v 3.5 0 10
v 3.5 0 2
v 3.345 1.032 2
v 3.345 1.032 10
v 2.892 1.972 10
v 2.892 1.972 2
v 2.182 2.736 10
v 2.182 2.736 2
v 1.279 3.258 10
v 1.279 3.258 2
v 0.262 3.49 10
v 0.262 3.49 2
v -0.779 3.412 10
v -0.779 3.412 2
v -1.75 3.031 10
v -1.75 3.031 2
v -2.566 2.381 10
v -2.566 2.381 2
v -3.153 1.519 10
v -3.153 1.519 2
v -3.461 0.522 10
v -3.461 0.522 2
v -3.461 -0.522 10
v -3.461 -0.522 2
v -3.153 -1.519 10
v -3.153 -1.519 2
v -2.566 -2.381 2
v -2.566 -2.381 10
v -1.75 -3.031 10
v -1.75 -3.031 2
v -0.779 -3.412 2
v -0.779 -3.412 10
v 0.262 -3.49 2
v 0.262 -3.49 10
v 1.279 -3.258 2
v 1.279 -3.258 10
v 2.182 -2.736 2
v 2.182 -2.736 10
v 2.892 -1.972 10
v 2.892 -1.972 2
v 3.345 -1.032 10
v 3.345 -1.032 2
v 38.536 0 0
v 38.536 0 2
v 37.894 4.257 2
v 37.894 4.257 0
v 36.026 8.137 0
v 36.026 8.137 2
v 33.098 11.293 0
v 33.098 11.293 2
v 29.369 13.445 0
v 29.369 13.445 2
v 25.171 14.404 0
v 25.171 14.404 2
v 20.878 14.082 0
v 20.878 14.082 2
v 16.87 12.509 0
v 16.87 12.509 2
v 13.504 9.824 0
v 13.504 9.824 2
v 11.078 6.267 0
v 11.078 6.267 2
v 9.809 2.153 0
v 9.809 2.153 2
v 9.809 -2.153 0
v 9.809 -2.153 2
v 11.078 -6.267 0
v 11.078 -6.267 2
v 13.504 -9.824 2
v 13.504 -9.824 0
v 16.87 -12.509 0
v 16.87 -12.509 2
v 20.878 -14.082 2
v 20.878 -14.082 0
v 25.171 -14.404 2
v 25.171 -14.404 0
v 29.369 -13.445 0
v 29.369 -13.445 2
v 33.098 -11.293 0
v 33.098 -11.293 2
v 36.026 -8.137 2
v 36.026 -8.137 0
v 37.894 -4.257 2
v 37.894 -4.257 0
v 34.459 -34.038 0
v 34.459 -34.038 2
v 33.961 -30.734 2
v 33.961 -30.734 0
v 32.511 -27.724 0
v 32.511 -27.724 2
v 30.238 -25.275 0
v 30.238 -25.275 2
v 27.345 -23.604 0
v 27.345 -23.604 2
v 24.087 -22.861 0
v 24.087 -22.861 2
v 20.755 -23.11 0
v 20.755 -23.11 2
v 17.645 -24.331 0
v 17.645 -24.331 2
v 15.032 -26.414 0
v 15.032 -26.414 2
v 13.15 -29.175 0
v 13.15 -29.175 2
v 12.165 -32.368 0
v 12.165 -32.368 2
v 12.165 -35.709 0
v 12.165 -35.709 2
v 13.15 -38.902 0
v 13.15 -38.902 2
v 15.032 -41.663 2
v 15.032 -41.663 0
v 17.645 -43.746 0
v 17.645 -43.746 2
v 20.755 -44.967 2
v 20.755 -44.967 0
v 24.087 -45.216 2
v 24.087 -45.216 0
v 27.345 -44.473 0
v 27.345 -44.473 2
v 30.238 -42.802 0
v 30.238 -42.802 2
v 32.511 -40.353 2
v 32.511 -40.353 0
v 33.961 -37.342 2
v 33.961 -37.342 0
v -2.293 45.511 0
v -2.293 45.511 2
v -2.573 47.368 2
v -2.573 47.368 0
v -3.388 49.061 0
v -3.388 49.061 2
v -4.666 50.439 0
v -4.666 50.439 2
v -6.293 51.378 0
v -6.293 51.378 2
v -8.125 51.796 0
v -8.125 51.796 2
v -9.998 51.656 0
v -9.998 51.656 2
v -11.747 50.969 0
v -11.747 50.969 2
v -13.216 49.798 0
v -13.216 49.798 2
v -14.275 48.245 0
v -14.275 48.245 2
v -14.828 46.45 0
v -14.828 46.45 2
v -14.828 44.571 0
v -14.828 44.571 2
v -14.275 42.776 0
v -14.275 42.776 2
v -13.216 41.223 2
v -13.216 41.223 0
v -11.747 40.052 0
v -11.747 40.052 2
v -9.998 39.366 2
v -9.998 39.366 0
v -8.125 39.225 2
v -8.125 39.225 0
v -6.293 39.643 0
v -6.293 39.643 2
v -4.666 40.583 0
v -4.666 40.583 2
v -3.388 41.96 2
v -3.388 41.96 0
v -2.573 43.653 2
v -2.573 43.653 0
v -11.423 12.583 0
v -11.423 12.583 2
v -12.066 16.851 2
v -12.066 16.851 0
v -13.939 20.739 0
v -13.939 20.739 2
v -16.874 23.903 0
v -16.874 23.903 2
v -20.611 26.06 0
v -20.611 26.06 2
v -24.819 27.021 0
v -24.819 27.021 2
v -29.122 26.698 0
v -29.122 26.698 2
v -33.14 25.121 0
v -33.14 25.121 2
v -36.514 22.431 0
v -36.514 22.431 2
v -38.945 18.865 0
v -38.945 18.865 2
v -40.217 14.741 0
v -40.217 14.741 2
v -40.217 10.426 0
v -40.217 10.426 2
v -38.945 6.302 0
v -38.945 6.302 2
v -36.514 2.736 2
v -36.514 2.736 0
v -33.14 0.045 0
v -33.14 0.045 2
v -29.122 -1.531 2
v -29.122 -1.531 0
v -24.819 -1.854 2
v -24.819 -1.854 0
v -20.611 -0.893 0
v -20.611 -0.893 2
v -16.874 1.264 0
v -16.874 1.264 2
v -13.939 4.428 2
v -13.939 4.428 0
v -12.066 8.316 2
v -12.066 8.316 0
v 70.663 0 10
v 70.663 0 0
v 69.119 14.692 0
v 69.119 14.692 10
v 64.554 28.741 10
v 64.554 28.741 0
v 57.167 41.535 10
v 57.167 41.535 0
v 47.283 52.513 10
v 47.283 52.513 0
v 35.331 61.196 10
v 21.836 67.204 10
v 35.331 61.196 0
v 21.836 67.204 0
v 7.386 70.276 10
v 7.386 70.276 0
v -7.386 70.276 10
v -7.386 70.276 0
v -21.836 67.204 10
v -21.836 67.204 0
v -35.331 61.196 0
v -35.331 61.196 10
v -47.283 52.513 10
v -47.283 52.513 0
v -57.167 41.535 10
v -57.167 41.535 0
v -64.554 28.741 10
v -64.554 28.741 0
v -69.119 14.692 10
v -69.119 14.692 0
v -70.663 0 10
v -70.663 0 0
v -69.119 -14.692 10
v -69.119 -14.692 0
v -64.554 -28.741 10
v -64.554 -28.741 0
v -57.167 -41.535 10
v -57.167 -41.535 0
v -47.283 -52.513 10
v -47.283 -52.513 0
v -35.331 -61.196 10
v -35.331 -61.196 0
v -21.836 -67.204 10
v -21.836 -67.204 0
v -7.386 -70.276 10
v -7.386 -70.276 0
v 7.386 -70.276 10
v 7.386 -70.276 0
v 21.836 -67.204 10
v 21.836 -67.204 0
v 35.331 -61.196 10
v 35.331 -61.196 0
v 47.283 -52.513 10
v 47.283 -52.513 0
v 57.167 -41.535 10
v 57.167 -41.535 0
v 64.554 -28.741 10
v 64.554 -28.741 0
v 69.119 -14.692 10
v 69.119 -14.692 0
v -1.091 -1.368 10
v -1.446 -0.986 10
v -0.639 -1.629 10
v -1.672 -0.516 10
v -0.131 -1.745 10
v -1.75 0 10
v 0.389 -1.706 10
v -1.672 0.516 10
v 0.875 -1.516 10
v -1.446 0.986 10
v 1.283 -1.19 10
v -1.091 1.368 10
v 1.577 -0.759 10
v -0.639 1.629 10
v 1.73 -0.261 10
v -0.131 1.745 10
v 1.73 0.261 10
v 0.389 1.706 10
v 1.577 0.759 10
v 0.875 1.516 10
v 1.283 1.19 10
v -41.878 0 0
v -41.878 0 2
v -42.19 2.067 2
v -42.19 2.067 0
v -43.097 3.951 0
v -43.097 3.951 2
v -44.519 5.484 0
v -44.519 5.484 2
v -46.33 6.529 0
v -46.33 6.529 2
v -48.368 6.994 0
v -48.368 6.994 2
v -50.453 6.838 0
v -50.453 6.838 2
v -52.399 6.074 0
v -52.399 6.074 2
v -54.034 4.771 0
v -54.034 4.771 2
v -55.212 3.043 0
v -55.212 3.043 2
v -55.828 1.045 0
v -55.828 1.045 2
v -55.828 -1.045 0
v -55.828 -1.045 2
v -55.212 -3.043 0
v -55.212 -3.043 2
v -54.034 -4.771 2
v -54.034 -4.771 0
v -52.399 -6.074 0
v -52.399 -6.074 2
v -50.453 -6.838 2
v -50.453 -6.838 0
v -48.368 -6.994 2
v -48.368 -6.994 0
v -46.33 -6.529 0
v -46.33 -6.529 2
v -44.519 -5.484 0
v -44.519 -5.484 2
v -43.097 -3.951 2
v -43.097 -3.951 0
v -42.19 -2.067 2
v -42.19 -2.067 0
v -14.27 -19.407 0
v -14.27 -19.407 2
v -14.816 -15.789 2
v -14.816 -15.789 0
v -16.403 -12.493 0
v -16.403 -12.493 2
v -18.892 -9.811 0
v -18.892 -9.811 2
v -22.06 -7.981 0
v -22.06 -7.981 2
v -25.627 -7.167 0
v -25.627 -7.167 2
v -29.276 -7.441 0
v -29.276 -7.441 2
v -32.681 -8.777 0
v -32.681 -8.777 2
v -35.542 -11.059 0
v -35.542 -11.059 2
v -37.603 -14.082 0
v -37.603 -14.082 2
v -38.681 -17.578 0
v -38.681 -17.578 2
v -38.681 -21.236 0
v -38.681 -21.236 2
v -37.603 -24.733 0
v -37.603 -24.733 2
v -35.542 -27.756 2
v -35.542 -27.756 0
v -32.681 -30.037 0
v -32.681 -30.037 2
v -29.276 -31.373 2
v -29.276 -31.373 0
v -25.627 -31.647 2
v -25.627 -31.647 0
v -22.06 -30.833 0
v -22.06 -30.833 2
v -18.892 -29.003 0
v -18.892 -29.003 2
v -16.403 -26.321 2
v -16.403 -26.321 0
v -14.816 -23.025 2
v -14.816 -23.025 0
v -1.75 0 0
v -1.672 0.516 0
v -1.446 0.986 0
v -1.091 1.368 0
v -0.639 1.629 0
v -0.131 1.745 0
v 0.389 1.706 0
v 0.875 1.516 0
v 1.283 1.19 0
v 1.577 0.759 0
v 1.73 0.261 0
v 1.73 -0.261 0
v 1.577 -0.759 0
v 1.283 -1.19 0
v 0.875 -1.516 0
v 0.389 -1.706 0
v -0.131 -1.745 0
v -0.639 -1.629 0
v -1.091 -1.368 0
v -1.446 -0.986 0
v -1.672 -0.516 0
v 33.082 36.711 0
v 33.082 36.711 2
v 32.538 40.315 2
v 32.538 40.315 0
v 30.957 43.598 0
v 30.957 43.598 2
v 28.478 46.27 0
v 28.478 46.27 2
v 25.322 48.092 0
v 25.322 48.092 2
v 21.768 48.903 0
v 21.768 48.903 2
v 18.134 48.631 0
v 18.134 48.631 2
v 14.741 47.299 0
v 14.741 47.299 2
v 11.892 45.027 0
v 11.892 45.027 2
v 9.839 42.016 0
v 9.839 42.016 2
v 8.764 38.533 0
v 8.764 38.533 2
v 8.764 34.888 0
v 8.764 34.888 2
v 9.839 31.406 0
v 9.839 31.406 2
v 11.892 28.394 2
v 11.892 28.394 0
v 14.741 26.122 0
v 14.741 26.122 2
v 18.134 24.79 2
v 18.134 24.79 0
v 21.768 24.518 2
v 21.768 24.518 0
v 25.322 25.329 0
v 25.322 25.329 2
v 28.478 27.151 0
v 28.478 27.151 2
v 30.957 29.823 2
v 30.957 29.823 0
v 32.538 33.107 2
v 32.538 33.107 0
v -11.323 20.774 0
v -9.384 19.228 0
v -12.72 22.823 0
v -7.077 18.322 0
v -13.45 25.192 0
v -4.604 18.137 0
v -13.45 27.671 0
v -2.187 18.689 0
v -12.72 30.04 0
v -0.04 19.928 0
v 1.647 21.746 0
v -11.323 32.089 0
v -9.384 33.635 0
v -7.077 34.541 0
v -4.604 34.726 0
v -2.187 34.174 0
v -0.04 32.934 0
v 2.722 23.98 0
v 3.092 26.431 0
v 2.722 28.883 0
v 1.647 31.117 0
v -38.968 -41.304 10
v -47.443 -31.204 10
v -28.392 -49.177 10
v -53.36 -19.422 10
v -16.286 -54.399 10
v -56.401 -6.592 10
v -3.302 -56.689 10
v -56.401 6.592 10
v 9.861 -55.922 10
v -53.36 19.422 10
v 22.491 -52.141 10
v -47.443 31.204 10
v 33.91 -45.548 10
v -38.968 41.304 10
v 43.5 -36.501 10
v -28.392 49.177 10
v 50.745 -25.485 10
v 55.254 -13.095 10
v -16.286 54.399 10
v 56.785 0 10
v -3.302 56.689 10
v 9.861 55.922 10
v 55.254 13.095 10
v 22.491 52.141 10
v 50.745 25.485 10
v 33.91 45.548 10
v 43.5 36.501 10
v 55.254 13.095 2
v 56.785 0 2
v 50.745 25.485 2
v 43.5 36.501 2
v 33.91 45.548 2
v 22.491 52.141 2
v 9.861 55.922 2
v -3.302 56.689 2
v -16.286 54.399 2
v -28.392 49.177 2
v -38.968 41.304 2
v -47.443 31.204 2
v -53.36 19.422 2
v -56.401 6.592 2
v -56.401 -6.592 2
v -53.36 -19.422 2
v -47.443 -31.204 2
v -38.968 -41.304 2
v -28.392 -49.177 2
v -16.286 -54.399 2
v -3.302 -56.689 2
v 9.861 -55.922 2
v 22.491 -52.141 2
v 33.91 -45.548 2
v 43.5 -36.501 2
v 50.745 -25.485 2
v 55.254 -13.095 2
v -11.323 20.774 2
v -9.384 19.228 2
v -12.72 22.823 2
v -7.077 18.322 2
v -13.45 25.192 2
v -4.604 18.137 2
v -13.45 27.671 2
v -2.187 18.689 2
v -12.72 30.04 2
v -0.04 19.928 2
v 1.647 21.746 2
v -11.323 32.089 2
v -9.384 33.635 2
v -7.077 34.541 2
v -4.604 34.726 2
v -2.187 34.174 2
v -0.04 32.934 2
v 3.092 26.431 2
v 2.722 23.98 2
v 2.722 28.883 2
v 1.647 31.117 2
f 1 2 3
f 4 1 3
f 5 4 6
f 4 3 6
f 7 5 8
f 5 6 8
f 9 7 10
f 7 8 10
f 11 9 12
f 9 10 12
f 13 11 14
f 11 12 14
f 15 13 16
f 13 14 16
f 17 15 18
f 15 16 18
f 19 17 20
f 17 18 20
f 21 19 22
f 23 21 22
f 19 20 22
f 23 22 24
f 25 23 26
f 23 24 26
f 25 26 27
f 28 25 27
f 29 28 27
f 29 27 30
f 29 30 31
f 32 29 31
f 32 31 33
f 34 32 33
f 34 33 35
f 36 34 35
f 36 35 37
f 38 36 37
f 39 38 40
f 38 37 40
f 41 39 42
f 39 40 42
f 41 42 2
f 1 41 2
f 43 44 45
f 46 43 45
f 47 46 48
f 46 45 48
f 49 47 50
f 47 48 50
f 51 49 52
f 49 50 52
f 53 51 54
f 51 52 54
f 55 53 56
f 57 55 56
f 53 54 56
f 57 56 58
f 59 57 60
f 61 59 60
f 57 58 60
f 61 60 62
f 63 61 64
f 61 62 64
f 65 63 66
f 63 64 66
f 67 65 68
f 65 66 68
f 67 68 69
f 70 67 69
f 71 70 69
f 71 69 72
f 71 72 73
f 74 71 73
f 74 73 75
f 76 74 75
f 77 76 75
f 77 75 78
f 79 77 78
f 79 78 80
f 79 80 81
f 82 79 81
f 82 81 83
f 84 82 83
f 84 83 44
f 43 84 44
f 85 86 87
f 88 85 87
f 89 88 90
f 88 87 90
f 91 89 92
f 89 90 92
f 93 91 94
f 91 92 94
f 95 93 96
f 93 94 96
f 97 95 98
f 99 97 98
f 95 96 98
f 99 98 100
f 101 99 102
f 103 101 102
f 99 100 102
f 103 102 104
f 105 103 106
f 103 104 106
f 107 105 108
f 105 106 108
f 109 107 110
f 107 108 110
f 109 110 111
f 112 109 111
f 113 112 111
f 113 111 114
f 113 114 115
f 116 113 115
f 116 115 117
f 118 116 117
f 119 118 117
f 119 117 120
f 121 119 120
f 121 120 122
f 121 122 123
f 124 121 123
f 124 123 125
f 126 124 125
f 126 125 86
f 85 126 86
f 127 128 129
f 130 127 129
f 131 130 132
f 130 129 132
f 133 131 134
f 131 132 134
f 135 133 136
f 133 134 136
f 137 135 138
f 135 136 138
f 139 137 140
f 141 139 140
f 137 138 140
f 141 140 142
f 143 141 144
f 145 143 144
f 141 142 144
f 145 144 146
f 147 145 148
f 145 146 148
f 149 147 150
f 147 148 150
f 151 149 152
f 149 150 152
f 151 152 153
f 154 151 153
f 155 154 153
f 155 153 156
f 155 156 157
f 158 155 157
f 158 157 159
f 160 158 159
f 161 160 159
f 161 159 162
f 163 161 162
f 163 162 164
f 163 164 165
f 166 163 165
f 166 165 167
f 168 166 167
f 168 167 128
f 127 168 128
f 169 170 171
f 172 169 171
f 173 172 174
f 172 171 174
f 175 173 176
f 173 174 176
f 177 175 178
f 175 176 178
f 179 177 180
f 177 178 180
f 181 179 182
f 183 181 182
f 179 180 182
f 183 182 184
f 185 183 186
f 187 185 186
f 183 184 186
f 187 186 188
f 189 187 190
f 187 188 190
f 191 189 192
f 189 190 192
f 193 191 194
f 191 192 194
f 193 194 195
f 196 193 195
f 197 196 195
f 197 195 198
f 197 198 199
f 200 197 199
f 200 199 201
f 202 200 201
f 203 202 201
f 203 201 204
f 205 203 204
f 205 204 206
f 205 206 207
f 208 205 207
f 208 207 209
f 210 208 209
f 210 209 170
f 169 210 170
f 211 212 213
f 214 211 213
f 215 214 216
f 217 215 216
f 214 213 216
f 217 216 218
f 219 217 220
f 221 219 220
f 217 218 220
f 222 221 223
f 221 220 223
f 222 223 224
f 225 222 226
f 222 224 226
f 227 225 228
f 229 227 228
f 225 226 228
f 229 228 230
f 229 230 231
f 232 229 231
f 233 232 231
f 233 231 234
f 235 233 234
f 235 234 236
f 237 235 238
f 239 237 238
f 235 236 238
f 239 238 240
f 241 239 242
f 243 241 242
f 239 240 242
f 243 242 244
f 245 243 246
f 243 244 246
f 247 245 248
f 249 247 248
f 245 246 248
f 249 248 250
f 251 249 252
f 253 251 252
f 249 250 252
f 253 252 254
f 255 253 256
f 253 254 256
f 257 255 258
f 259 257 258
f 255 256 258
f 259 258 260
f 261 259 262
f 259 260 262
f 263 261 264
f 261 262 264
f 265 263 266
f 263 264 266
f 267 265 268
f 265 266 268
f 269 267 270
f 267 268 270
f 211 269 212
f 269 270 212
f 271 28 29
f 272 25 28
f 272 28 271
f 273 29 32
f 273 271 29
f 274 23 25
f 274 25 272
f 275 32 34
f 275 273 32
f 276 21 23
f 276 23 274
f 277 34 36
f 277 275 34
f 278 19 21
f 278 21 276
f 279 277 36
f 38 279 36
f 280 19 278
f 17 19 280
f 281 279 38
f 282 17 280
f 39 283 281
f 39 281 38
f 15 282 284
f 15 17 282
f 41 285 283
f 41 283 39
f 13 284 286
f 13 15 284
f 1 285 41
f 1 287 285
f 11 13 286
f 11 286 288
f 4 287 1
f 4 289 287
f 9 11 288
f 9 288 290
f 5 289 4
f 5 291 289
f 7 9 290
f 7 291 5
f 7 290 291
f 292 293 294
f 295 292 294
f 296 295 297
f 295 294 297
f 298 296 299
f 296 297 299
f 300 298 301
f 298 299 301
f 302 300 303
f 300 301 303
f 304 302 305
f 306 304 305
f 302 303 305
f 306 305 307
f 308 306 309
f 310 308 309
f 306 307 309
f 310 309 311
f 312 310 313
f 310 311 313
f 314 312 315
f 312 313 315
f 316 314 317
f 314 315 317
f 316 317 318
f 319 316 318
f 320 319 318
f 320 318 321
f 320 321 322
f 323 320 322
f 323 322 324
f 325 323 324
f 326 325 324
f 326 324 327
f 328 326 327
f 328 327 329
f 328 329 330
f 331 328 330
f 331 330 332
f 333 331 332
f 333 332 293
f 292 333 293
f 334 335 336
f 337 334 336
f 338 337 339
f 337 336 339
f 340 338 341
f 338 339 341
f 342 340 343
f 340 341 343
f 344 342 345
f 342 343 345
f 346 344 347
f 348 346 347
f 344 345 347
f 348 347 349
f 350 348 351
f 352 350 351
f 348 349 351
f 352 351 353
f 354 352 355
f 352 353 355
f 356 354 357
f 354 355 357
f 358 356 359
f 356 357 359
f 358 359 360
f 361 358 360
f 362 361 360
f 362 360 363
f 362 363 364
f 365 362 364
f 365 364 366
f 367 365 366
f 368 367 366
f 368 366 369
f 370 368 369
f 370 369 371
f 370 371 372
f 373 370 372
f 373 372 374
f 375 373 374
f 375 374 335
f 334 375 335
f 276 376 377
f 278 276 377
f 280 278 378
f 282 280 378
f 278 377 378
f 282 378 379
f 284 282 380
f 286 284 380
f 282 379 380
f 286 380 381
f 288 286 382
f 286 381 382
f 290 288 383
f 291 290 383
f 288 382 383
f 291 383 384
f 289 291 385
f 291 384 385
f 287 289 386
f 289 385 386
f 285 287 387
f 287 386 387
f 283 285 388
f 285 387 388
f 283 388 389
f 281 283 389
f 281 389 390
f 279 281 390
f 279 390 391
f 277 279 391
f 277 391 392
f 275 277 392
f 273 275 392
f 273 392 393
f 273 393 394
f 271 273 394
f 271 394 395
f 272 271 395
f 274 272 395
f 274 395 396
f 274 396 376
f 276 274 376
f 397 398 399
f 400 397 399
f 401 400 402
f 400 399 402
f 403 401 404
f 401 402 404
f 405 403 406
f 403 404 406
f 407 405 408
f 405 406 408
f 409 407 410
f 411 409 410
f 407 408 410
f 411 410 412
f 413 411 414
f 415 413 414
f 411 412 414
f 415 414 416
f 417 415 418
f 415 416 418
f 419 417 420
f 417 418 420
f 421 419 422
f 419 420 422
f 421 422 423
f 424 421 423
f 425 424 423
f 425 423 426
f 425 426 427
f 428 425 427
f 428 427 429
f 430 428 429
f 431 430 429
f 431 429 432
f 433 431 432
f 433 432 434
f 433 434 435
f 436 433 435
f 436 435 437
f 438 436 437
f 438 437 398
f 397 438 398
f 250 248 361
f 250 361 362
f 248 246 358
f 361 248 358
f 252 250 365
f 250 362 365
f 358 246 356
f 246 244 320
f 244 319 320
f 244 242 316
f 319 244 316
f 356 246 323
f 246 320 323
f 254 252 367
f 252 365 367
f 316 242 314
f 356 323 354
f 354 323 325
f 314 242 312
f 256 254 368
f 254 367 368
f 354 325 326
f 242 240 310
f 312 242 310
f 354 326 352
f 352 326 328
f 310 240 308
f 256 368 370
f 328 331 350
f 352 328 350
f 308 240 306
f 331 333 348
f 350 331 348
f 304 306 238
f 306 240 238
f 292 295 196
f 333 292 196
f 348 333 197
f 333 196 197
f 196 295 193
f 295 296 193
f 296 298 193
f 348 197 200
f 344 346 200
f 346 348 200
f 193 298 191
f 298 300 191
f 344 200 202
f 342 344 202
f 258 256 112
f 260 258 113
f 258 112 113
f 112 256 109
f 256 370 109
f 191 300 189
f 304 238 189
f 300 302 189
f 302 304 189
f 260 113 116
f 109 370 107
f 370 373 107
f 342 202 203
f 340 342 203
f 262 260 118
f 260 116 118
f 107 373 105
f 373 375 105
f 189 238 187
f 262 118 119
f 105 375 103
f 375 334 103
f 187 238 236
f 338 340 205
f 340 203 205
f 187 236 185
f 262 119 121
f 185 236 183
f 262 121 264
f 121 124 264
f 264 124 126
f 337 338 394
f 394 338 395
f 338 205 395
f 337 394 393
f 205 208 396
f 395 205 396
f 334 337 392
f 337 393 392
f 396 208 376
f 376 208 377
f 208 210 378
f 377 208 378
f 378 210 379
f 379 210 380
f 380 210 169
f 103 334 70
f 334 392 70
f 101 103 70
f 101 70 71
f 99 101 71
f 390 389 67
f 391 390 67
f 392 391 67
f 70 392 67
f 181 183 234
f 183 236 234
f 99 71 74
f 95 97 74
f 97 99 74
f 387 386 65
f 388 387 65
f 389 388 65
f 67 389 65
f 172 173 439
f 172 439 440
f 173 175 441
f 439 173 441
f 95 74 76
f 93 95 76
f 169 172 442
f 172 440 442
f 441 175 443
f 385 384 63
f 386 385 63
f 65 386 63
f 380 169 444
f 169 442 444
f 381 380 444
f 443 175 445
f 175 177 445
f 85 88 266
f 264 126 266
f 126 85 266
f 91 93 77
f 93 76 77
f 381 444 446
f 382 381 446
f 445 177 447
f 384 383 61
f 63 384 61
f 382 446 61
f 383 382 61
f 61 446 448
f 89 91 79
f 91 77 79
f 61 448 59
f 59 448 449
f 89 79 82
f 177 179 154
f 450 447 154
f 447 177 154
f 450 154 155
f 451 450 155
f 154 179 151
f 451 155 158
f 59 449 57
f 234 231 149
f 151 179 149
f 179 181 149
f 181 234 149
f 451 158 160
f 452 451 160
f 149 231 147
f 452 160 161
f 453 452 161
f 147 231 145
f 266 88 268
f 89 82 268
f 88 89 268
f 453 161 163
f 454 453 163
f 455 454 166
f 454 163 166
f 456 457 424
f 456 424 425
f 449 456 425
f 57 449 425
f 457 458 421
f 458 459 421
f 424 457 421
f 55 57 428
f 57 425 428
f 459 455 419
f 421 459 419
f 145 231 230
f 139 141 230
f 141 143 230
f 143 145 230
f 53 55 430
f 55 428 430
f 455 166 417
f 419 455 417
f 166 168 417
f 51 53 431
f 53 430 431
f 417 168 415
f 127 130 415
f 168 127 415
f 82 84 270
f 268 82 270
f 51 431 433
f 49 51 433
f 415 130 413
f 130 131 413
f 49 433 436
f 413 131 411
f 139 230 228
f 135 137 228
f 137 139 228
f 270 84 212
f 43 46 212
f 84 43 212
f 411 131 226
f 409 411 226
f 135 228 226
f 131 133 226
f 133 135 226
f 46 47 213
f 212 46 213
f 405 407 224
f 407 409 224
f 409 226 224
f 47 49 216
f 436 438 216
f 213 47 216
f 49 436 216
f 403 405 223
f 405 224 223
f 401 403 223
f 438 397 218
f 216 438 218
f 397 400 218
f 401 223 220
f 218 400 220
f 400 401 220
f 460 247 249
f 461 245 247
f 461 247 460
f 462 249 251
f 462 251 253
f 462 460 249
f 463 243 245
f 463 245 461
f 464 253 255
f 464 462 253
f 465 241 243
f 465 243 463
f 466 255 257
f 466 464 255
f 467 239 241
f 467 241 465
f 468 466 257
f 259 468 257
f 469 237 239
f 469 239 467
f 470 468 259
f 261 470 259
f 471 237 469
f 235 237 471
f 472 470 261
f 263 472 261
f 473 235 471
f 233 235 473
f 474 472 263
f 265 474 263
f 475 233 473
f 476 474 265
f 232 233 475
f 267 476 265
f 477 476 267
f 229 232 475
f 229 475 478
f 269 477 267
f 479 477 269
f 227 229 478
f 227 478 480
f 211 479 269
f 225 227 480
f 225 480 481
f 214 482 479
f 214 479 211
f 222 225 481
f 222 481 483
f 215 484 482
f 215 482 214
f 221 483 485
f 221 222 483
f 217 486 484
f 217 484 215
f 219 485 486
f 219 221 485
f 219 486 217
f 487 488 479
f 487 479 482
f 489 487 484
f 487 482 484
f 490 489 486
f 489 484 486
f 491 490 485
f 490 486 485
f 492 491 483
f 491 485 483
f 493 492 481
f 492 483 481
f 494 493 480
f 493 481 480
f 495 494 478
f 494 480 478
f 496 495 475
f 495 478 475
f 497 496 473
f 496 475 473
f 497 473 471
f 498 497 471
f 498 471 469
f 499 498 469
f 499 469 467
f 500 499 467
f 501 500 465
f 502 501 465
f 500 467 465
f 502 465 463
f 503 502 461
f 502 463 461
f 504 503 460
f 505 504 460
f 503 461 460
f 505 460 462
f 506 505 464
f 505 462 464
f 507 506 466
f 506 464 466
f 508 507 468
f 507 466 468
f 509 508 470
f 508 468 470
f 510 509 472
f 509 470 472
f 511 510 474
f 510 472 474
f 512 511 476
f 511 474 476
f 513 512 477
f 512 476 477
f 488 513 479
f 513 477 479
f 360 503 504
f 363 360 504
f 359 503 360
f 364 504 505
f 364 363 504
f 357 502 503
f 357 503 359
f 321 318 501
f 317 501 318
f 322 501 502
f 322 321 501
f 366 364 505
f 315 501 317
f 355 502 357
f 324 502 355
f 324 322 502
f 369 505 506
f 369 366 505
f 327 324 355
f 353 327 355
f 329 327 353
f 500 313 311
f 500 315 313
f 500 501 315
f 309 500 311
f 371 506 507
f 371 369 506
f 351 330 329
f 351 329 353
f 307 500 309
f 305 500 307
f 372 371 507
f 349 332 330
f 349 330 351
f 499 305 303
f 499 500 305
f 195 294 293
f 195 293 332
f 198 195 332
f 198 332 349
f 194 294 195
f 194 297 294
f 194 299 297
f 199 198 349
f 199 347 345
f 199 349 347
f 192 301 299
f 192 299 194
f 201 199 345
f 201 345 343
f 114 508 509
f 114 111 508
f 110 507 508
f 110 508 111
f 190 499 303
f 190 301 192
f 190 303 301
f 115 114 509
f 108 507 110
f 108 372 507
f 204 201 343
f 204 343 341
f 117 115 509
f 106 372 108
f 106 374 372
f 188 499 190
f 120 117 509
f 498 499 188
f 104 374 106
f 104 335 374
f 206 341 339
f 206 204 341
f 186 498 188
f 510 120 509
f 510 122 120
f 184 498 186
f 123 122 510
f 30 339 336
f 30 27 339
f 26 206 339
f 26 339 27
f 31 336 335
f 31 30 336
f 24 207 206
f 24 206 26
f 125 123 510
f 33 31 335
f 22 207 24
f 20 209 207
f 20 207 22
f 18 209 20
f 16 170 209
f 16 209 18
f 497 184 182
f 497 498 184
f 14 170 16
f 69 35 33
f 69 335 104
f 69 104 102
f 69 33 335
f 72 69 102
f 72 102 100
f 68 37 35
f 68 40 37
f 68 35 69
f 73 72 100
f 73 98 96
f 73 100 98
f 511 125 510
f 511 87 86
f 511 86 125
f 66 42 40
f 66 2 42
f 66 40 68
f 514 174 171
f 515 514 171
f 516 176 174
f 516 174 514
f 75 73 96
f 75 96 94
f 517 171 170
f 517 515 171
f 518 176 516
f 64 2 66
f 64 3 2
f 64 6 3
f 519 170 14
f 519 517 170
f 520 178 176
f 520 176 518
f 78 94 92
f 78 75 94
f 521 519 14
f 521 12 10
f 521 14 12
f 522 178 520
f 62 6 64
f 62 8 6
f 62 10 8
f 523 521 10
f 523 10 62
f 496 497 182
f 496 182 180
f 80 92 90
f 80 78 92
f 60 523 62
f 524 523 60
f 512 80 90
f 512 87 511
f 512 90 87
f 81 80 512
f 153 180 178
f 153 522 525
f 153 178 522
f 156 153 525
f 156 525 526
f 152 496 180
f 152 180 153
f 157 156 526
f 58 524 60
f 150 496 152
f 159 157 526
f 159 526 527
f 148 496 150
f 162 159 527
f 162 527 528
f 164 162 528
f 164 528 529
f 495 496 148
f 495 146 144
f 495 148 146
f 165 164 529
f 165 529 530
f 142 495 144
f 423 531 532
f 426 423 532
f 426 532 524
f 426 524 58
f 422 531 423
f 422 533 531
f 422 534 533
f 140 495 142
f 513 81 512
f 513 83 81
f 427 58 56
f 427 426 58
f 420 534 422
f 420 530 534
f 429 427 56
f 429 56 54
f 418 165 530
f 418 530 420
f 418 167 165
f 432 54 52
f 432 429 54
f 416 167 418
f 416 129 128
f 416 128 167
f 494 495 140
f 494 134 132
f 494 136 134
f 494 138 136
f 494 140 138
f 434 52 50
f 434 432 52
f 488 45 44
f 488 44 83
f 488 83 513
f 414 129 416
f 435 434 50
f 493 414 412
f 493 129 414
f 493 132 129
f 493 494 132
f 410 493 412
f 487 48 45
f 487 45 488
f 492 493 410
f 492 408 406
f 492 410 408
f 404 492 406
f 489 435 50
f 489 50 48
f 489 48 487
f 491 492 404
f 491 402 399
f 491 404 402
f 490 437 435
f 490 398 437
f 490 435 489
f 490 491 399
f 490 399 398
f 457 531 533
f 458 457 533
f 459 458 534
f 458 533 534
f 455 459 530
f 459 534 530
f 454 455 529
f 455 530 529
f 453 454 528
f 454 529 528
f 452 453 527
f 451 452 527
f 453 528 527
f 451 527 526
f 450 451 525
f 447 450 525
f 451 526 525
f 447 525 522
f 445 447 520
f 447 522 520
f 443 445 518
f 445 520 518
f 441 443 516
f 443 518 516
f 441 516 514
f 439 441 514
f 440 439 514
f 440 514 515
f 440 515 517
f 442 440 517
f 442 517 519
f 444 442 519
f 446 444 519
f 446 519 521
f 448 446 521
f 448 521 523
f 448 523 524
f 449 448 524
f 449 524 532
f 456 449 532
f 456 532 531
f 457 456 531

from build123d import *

# Parameters (mm, degrees)
F0_R      = 70.662875
F1_DEPTH  = 10
F2_R      = 56.784897
F3_DEPTH  = 8
F4_R      = 14.477715
F5_DEPTH  = 8
F6_R      = 12.226907
F7_DEPTH  = 8
F8_R      = 7.014045
F9_DEPTH  = 8
F10_R     = 14.443937
F11_DEPTH = 8
F13_R     = 6.303091
F14_DEPTH = 8
F15_R     = 8.317638
F16_DEPTH = 8
F17_R     = 6.025281
F18_DEPTH = 8
F19_R     = 11.209177
F20_DEPTH = 8
F12_R     = 3.5
F21_DEPTH = 8
F23_D     = 3.5
F24_R     = 12.274082
F25_DEPTH = 8


with BuildPart() as f1:
    # F0 (on Top) → F1 (new body)
    with BuildSketch(Plane.XY):
        Circle(F0_R)
    extrude(amount=F1_DEPTH)

    # F2 (on face) → F3 (cut)
    with BuildSketch(Plane.XY.offset(10)):
        Circle(F2_R)
    extrude(amount=-F3_DEPTH, mode=Mode.SUBTRACT)

    # F4 (on face) → F5 (cut)
    with BuildSketch(Plane.XY.offset(2)):
        with Locations((-25.900649, 12.583426)):
            Circle(F4_R)
    extrude(amount=-F5_DEPTH, mode=Mode.SUBTRACT)

    # F6 (on face) → F7 (cut)
    with BuildSketch(Plane.XY.offset(2)):
        with Locations((20.854684, 36.710624)):
            Circle(F6_R)
    extrude(amount=-F7_DEPTH, mode=Mode.SUBTRACT)

    # F8 (on face) → F9 (cut)
    with BuildSketch(Plane.XY.offset(2)):
        with Locations((-48.892226, 0)):
            Circle(F8_R)
    extrude(amount=-F9_DEPTH, mode=Mode.SUBTRACT)

    # F10 (on face) → F11 (cut)
    with BuildSketch(Plane.XY.offset(2)):
        with Locations((24.09202, 0)):
            Circle(F10_R)
    extrude(amount=-F11_DEPTH, mode=Mode.SUBTRACT)

    # F13 (on face) → F14 (cut)
    with BuildSketch(Plane.XY.offset(2)):
        with Locations((-8.595636, 45.51062)):
            Circle(F13_R)
    extrude(amount=-F14_DEPTH, mode=Mode.SUBTRACT)

    # F15 (on face) → F16 (cut)
    with BuildSketch(Plane.XY.offset(2)):
        with Locations((-5.225664, 26.43148)):
            Circle(F15_R)
    extrude(amount=-F16_DEPTH, mode=Mode.SUBTRACT)

    # F17 (on Top) → F18 (cut)
    with BuildSketch(Plane.XY):
        with Locations((14.564808, -20.261167)):
            Circle(F17_R)
    extrude(amount=-F18_DEPTH, mode=Mode.SUBTRACT)

    # F19 (on face) → F20 (cut)
    with BuildSketch(Plane.XY.offset(2)):
        with Locations((23.249339, -34.03841)):
            Circle(F19_R)
    extrude(amount=-F20_DEPTH, mode=Mode.SUBTRACT)

    # F12 (on face) → F21 (join)
    with BuildSketch(Plane.XY.offset(2)):
        Circle(F12_R)
    extrude(amount=F21_DEPTH)

    # F23 (through all)
    with Locations(Plane.XY.offset(10)):
        with Locations((0, 0)):
            Hole(F23_D / 2)

    # F24 (on face) → F25 (cut)
    with BuildSketch(Plane.XY.offset(2)):
        with Locations((-26.544379, -19.407054)):
            Circle(F24_R)
    extrude(amount=-F25_DEPTH, mode=Mode.SUBTRACT)


solid = f1.part
